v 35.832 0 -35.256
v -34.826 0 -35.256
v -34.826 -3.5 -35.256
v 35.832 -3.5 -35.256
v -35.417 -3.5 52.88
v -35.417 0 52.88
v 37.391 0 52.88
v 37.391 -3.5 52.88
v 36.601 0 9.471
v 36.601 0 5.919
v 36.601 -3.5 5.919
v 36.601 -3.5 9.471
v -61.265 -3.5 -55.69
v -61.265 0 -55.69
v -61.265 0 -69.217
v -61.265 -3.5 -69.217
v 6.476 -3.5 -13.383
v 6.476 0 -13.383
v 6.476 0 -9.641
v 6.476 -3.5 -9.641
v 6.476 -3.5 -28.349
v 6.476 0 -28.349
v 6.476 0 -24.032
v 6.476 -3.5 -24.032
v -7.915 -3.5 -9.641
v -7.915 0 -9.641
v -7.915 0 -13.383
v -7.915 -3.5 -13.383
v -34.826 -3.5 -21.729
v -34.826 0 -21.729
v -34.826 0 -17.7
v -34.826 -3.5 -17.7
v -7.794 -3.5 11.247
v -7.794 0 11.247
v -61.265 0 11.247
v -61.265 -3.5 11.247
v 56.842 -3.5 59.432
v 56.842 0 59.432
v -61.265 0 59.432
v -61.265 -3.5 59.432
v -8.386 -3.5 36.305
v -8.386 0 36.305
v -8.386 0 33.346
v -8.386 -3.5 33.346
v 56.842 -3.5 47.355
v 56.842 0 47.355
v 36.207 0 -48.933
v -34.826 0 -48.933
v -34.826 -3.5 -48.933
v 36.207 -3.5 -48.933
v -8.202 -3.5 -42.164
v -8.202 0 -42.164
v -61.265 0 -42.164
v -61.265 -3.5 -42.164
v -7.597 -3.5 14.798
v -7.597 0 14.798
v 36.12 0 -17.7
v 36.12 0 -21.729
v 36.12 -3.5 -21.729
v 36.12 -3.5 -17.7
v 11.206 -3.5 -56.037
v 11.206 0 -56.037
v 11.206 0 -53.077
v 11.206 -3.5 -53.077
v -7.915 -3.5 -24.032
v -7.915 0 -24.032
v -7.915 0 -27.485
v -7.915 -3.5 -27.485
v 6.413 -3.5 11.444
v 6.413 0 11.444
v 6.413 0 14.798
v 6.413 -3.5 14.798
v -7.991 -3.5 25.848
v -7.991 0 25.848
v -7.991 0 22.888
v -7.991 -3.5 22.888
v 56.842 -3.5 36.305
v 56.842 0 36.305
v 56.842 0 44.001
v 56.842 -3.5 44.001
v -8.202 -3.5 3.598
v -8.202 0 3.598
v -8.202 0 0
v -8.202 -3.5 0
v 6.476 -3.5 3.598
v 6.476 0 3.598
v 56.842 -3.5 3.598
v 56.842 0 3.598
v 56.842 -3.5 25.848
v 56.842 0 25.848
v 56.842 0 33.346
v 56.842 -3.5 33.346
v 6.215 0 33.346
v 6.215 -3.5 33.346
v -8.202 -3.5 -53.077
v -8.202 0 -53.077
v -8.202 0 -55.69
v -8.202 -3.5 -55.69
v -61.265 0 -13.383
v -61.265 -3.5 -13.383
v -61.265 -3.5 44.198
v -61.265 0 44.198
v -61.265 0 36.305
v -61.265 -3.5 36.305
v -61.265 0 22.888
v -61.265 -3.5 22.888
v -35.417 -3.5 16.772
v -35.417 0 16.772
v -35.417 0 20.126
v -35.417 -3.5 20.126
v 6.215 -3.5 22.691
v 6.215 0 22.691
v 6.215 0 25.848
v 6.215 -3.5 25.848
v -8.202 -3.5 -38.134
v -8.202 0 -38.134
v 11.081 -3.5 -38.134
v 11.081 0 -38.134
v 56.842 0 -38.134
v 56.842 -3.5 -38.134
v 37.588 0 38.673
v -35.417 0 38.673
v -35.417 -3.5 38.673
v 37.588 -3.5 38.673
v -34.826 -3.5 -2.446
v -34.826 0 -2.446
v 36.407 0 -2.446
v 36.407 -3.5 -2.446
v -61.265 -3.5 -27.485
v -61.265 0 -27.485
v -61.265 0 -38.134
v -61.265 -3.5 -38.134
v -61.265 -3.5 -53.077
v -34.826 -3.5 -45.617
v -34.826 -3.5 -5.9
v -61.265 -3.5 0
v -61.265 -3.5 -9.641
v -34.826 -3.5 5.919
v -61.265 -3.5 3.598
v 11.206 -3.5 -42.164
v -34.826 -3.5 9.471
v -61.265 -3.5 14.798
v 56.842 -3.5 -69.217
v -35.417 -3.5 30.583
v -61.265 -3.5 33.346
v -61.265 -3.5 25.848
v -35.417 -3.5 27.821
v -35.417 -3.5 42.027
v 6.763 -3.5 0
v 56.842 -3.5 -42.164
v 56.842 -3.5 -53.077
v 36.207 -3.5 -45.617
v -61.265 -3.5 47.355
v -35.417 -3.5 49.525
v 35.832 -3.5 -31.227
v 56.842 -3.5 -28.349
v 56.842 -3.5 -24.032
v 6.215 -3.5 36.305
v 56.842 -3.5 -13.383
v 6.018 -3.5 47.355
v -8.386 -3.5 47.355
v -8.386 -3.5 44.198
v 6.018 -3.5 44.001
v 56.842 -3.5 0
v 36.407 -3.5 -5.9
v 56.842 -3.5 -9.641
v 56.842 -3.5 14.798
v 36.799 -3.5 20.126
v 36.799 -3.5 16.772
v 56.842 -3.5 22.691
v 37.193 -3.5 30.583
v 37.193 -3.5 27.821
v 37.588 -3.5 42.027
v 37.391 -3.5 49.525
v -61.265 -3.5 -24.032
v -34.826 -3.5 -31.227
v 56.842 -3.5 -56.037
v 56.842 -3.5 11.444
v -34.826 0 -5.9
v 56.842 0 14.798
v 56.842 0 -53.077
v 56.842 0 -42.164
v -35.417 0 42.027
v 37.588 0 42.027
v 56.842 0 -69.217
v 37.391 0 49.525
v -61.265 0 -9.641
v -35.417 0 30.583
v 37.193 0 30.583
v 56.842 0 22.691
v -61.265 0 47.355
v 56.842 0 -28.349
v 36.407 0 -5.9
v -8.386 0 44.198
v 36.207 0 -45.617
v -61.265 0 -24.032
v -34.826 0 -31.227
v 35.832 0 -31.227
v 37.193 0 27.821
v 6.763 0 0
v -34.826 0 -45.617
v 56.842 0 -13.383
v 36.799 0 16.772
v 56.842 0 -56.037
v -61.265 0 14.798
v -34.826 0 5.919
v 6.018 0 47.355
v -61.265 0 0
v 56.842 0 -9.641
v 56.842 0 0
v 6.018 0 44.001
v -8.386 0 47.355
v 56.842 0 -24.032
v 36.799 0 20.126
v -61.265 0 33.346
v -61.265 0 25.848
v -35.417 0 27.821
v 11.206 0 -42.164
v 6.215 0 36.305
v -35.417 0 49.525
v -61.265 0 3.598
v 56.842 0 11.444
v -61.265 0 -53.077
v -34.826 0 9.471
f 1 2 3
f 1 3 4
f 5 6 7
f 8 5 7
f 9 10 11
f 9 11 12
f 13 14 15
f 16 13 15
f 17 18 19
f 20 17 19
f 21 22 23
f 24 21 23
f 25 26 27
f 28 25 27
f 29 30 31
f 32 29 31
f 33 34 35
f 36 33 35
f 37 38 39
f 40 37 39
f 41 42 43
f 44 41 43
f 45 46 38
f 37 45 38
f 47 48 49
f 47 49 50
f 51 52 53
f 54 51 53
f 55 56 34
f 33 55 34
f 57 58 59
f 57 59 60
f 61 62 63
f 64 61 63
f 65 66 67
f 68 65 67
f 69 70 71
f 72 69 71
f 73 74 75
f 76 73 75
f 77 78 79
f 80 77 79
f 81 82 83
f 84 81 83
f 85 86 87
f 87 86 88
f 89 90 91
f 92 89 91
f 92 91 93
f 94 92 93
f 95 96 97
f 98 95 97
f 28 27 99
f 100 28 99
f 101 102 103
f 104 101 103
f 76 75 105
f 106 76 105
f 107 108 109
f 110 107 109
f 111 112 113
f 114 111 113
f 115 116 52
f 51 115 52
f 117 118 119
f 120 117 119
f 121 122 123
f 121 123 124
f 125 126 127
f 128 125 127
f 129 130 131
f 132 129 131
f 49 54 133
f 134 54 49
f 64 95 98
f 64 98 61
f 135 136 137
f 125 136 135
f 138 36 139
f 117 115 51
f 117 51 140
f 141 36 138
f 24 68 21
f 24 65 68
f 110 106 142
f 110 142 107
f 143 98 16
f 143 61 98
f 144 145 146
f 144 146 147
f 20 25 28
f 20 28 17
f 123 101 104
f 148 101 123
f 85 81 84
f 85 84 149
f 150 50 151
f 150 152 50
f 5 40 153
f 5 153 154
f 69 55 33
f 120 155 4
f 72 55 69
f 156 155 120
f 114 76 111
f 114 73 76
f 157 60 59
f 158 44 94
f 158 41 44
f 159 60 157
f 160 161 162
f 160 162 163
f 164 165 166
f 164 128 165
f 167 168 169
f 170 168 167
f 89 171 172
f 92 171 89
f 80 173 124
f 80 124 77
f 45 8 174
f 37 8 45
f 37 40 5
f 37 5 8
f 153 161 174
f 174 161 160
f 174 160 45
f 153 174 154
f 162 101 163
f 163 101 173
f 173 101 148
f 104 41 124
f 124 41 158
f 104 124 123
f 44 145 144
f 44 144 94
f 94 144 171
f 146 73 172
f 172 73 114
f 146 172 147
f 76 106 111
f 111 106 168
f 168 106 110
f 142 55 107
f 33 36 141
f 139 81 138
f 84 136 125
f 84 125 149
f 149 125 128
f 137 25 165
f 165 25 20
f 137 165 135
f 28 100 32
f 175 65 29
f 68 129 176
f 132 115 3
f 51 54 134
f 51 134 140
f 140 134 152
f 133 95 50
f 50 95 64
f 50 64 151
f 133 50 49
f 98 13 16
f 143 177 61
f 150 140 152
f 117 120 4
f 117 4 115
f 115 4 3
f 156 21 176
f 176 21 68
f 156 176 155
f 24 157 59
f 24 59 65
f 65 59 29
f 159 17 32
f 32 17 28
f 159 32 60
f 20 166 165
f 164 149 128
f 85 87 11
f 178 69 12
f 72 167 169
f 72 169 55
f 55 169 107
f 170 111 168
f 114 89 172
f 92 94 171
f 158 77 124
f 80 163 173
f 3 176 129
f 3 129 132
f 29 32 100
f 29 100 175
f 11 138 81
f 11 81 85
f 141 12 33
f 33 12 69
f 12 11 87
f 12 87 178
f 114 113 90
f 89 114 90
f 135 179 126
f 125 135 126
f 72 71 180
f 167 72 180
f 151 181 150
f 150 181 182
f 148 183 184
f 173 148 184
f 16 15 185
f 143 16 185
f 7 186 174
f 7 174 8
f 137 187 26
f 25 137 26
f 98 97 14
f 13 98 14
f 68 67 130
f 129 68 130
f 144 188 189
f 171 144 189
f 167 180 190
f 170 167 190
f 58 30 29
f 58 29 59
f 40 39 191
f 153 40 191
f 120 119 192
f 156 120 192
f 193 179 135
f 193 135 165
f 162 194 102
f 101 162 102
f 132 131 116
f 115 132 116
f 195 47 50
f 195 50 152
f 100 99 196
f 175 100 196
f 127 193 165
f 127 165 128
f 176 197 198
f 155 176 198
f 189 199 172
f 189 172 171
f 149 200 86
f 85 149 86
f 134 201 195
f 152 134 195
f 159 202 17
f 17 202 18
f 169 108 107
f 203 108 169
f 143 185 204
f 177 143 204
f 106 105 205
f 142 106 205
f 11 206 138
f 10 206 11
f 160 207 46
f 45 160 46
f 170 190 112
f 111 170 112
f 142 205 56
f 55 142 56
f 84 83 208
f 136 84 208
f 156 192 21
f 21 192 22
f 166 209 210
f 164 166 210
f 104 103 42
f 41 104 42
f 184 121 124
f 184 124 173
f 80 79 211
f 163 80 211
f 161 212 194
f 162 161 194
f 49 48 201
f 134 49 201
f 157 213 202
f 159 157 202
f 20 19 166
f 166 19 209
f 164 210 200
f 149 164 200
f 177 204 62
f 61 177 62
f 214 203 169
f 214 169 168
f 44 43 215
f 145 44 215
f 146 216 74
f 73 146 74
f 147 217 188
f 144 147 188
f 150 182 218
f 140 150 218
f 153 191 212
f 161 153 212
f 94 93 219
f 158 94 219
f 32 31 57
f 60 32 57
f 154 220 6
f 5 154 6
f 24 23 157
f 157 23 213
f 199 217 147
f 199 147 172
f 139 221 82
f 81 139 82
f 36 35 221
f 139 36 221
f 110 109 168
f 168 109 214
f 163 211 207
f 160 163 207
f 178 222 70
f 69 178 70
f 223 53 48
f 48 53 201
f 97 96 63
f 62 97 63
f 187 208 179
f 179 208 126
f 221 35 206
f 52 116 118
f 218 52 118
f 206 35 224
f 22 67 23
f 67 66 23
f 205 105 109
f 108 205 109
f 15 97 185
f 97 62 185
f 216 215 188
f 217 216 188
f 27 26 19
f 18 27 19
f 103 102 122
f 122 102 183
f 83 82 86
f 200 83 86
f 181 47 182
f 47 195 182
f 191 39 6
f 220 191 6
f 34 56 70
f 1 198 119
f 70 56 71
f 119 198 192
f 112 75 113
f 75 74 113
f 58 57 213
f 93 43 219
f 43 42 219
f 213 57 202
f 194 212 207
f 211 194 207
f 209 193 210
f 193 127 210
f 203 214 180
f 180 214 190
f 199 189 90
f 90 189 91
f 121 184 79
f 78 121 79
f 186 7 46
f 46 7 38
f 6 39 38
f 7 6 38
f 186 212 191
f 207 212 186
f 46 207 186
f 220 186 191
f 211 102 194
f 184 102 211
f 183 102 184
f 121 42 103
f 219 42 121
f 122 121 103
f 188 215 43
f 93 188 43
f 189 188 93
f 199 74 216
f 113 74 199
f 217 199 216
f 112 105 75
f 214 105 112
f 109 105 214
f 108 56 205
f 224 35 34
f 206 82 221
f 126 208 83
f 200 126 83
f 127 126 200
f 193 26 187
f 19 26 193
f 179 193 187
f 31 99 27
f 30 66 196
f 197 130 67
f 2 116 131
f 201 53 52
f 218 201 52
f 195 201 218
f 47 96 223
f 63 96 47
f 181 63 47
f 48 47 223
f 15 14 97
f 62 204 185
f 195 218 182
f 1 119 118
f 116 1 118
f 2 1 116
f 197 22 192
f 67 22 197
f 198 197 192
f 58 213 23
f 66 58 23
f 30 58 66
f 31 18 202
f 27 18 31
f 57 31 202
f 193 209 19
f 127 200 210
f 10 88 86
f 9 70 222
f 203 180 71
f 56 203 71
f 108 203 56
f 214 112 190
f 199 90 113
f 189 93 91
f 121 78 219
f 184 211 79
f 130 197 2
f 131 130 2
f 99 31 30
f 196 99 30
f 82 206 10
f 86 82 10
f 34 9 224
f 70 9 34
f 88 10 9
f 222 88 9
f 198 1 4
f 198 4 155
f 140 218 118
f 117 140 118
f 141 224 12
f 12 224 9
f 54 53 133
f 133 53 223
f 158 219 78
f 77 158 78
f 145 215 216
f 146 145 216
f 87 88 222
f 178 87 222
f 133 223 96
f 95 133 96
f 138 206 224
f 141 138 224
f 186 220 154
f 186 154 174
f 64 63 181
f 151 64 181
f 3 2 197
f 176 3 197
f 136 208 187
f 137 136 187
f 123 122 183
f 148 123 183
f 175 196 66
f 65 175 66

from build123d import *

# Parameters (mm, degrees)
F0_W     = 71.032305
F0_H     = 3.316156
F0_W_2   = 70.65738
F0_H_2   = 4.029283
F0_W_3   = 70.945185
F0_H_3   = 4.029279
F0_W_4   = 71.23299
F0_H_4   = 3.453669
F0_W_5   = 71.426928
F0_H_5   = 3.551615
F0_W_6   = 72.216179
F0_H_6   = 3.354305
F0_W_7   = 72.610803
F0_H_7   = 2.762366
F0_W_8   = 73.005423
F0_H_8   = 3.354303
F0_W_9   = 72.808113
F0_H_9   = 3.354299
F1_DEPTH = 3.5


with BuildPart() as f1:
    # F0 (on Front) → F1 (new body)
    with BuildSketch(Plane.XZ):
        Polygon((56.841634, 59.431892), (-61.265364, 59.431892), (-61.265364, 47.354873), (-8.385758, 47.354873), (-8.385758, 44.197883), (-61.265364, 44.197883), (-61.265364, 36.305401), (-8.385758, 36.305401), (-8.385758, 33.345722), (-61.265364, 33.345722), (-61.265364, 25.847867), (-7.991134, 25.847867), (-7.991134, 22.888189), (-61.265364, 22.888189), (-61.265364, 14.798397), (-7.596511, 14.798397), (-7.793822, 11.246782), (-61.265364, 11.246782), (-61.265364, 3.597572), (-8.202464, 3.597572), (-8.202464, 0), (-61.265364, 0), (-61.265364, -9.641493), (-7.914659, -9.641493), (-7.914659, -13.382968), (-61.265364, -13.382968), (-61.265364, -24.031783), (-7.914659, -24.031783), (-7.914659, -27.485449), (-61.265364, -27.485449), (-61.265364, -38.134262), (-8.202464, -38.134262), (-8.202464, -42.163543), (-61.265364, -42.163543), (-61.265364, -53.076919), (-8.202464, -53.076919), (-8.202464, -55.690415), (-61.265364, -55.690415), (-61.265364, -69.217287), (56.841634, -69.217287), (56.841634, -56.036595), (11.206436, -56.036595), (11.206436, -53.076919), (56.841634, -53.076919), (56.841634, -42.163543), (11.206436, -42.163543), (11.080521, -38.134262), (56.841634, -38.134262), (56.841634, -28.348867), (6.475631, -28.348867), (6.475631, -24.031783), (56.841634, -24.031783), (56.841634, -13.382968), (6.475631, -13.382968), (6.475631, -9.641493), (56.841634, -9.641493), (56.841634, 0), (6.763437, 0), (6.475631, 3.597572), (56.841634, 3.597572), (56.841634, 11.444095), (6.412639, 11.444095), (6.412639, 14.798397), (56.841634, 14.798397), (56.841634, 22.690875), (6.215328, 22.690875), (6.215328, 25.847867), (56.841634, 25.847867), (56.841634, 33.345722), (6.215328, 33.345722), (6.215328, 36.305401), (56.841634, 36.305401), (56.841634, 44.000566), (6.018014, 44.000566), (6.018014, 47.354873), (56.841634, 47.354873), align=None)
        with Locations((0.690593, -47.27529)):
            Rectangle(F0_W, F0_H, mode=Mode.SUBTRACT)
        with Locations((0.50313, -33.241566)):
            Rectangle(F0_W_2, F0_H_2, mode=Mode.SUBTRACT)
        with Locations((0.647033, -19.714693)):
            Rectangle(F0_W_3, F0_H_3, mode=Mode.SUBTRACT)
        with Locations((0.790935, -4.173183)):
            Rectangle(F0_W_4, F0_H_4, mode=Mode.SUBTRACT)
        with Locations((0.887904, 7.695167)):
            Rectangle(F0_W_5, F0_H_5, mode=Mode.SUBTRACT)
        with Locations((0.690593, 18.448668)):
            Rectangle(F0_W_6, F0_H_6, mode=Mode.SUBTRACT)
        with Locations((0.887905, 29.202171)):
            Rectangle(F0_W_7, F0_H_7, mode=Mode.SUBTRACT)
        with Locations((1.085214, 40.350296)):
            Rectangle(F0_W_8, F0_H_8, mode=Mode.SUBTRACT)
        with Locations((0.98656, 51.202455)):
            Rectangle(F0_W_9, F0_H_9, mode=Mode.SUBTRACT)
    extrude(amount=F1_DEPTH)


solid = f1.part
